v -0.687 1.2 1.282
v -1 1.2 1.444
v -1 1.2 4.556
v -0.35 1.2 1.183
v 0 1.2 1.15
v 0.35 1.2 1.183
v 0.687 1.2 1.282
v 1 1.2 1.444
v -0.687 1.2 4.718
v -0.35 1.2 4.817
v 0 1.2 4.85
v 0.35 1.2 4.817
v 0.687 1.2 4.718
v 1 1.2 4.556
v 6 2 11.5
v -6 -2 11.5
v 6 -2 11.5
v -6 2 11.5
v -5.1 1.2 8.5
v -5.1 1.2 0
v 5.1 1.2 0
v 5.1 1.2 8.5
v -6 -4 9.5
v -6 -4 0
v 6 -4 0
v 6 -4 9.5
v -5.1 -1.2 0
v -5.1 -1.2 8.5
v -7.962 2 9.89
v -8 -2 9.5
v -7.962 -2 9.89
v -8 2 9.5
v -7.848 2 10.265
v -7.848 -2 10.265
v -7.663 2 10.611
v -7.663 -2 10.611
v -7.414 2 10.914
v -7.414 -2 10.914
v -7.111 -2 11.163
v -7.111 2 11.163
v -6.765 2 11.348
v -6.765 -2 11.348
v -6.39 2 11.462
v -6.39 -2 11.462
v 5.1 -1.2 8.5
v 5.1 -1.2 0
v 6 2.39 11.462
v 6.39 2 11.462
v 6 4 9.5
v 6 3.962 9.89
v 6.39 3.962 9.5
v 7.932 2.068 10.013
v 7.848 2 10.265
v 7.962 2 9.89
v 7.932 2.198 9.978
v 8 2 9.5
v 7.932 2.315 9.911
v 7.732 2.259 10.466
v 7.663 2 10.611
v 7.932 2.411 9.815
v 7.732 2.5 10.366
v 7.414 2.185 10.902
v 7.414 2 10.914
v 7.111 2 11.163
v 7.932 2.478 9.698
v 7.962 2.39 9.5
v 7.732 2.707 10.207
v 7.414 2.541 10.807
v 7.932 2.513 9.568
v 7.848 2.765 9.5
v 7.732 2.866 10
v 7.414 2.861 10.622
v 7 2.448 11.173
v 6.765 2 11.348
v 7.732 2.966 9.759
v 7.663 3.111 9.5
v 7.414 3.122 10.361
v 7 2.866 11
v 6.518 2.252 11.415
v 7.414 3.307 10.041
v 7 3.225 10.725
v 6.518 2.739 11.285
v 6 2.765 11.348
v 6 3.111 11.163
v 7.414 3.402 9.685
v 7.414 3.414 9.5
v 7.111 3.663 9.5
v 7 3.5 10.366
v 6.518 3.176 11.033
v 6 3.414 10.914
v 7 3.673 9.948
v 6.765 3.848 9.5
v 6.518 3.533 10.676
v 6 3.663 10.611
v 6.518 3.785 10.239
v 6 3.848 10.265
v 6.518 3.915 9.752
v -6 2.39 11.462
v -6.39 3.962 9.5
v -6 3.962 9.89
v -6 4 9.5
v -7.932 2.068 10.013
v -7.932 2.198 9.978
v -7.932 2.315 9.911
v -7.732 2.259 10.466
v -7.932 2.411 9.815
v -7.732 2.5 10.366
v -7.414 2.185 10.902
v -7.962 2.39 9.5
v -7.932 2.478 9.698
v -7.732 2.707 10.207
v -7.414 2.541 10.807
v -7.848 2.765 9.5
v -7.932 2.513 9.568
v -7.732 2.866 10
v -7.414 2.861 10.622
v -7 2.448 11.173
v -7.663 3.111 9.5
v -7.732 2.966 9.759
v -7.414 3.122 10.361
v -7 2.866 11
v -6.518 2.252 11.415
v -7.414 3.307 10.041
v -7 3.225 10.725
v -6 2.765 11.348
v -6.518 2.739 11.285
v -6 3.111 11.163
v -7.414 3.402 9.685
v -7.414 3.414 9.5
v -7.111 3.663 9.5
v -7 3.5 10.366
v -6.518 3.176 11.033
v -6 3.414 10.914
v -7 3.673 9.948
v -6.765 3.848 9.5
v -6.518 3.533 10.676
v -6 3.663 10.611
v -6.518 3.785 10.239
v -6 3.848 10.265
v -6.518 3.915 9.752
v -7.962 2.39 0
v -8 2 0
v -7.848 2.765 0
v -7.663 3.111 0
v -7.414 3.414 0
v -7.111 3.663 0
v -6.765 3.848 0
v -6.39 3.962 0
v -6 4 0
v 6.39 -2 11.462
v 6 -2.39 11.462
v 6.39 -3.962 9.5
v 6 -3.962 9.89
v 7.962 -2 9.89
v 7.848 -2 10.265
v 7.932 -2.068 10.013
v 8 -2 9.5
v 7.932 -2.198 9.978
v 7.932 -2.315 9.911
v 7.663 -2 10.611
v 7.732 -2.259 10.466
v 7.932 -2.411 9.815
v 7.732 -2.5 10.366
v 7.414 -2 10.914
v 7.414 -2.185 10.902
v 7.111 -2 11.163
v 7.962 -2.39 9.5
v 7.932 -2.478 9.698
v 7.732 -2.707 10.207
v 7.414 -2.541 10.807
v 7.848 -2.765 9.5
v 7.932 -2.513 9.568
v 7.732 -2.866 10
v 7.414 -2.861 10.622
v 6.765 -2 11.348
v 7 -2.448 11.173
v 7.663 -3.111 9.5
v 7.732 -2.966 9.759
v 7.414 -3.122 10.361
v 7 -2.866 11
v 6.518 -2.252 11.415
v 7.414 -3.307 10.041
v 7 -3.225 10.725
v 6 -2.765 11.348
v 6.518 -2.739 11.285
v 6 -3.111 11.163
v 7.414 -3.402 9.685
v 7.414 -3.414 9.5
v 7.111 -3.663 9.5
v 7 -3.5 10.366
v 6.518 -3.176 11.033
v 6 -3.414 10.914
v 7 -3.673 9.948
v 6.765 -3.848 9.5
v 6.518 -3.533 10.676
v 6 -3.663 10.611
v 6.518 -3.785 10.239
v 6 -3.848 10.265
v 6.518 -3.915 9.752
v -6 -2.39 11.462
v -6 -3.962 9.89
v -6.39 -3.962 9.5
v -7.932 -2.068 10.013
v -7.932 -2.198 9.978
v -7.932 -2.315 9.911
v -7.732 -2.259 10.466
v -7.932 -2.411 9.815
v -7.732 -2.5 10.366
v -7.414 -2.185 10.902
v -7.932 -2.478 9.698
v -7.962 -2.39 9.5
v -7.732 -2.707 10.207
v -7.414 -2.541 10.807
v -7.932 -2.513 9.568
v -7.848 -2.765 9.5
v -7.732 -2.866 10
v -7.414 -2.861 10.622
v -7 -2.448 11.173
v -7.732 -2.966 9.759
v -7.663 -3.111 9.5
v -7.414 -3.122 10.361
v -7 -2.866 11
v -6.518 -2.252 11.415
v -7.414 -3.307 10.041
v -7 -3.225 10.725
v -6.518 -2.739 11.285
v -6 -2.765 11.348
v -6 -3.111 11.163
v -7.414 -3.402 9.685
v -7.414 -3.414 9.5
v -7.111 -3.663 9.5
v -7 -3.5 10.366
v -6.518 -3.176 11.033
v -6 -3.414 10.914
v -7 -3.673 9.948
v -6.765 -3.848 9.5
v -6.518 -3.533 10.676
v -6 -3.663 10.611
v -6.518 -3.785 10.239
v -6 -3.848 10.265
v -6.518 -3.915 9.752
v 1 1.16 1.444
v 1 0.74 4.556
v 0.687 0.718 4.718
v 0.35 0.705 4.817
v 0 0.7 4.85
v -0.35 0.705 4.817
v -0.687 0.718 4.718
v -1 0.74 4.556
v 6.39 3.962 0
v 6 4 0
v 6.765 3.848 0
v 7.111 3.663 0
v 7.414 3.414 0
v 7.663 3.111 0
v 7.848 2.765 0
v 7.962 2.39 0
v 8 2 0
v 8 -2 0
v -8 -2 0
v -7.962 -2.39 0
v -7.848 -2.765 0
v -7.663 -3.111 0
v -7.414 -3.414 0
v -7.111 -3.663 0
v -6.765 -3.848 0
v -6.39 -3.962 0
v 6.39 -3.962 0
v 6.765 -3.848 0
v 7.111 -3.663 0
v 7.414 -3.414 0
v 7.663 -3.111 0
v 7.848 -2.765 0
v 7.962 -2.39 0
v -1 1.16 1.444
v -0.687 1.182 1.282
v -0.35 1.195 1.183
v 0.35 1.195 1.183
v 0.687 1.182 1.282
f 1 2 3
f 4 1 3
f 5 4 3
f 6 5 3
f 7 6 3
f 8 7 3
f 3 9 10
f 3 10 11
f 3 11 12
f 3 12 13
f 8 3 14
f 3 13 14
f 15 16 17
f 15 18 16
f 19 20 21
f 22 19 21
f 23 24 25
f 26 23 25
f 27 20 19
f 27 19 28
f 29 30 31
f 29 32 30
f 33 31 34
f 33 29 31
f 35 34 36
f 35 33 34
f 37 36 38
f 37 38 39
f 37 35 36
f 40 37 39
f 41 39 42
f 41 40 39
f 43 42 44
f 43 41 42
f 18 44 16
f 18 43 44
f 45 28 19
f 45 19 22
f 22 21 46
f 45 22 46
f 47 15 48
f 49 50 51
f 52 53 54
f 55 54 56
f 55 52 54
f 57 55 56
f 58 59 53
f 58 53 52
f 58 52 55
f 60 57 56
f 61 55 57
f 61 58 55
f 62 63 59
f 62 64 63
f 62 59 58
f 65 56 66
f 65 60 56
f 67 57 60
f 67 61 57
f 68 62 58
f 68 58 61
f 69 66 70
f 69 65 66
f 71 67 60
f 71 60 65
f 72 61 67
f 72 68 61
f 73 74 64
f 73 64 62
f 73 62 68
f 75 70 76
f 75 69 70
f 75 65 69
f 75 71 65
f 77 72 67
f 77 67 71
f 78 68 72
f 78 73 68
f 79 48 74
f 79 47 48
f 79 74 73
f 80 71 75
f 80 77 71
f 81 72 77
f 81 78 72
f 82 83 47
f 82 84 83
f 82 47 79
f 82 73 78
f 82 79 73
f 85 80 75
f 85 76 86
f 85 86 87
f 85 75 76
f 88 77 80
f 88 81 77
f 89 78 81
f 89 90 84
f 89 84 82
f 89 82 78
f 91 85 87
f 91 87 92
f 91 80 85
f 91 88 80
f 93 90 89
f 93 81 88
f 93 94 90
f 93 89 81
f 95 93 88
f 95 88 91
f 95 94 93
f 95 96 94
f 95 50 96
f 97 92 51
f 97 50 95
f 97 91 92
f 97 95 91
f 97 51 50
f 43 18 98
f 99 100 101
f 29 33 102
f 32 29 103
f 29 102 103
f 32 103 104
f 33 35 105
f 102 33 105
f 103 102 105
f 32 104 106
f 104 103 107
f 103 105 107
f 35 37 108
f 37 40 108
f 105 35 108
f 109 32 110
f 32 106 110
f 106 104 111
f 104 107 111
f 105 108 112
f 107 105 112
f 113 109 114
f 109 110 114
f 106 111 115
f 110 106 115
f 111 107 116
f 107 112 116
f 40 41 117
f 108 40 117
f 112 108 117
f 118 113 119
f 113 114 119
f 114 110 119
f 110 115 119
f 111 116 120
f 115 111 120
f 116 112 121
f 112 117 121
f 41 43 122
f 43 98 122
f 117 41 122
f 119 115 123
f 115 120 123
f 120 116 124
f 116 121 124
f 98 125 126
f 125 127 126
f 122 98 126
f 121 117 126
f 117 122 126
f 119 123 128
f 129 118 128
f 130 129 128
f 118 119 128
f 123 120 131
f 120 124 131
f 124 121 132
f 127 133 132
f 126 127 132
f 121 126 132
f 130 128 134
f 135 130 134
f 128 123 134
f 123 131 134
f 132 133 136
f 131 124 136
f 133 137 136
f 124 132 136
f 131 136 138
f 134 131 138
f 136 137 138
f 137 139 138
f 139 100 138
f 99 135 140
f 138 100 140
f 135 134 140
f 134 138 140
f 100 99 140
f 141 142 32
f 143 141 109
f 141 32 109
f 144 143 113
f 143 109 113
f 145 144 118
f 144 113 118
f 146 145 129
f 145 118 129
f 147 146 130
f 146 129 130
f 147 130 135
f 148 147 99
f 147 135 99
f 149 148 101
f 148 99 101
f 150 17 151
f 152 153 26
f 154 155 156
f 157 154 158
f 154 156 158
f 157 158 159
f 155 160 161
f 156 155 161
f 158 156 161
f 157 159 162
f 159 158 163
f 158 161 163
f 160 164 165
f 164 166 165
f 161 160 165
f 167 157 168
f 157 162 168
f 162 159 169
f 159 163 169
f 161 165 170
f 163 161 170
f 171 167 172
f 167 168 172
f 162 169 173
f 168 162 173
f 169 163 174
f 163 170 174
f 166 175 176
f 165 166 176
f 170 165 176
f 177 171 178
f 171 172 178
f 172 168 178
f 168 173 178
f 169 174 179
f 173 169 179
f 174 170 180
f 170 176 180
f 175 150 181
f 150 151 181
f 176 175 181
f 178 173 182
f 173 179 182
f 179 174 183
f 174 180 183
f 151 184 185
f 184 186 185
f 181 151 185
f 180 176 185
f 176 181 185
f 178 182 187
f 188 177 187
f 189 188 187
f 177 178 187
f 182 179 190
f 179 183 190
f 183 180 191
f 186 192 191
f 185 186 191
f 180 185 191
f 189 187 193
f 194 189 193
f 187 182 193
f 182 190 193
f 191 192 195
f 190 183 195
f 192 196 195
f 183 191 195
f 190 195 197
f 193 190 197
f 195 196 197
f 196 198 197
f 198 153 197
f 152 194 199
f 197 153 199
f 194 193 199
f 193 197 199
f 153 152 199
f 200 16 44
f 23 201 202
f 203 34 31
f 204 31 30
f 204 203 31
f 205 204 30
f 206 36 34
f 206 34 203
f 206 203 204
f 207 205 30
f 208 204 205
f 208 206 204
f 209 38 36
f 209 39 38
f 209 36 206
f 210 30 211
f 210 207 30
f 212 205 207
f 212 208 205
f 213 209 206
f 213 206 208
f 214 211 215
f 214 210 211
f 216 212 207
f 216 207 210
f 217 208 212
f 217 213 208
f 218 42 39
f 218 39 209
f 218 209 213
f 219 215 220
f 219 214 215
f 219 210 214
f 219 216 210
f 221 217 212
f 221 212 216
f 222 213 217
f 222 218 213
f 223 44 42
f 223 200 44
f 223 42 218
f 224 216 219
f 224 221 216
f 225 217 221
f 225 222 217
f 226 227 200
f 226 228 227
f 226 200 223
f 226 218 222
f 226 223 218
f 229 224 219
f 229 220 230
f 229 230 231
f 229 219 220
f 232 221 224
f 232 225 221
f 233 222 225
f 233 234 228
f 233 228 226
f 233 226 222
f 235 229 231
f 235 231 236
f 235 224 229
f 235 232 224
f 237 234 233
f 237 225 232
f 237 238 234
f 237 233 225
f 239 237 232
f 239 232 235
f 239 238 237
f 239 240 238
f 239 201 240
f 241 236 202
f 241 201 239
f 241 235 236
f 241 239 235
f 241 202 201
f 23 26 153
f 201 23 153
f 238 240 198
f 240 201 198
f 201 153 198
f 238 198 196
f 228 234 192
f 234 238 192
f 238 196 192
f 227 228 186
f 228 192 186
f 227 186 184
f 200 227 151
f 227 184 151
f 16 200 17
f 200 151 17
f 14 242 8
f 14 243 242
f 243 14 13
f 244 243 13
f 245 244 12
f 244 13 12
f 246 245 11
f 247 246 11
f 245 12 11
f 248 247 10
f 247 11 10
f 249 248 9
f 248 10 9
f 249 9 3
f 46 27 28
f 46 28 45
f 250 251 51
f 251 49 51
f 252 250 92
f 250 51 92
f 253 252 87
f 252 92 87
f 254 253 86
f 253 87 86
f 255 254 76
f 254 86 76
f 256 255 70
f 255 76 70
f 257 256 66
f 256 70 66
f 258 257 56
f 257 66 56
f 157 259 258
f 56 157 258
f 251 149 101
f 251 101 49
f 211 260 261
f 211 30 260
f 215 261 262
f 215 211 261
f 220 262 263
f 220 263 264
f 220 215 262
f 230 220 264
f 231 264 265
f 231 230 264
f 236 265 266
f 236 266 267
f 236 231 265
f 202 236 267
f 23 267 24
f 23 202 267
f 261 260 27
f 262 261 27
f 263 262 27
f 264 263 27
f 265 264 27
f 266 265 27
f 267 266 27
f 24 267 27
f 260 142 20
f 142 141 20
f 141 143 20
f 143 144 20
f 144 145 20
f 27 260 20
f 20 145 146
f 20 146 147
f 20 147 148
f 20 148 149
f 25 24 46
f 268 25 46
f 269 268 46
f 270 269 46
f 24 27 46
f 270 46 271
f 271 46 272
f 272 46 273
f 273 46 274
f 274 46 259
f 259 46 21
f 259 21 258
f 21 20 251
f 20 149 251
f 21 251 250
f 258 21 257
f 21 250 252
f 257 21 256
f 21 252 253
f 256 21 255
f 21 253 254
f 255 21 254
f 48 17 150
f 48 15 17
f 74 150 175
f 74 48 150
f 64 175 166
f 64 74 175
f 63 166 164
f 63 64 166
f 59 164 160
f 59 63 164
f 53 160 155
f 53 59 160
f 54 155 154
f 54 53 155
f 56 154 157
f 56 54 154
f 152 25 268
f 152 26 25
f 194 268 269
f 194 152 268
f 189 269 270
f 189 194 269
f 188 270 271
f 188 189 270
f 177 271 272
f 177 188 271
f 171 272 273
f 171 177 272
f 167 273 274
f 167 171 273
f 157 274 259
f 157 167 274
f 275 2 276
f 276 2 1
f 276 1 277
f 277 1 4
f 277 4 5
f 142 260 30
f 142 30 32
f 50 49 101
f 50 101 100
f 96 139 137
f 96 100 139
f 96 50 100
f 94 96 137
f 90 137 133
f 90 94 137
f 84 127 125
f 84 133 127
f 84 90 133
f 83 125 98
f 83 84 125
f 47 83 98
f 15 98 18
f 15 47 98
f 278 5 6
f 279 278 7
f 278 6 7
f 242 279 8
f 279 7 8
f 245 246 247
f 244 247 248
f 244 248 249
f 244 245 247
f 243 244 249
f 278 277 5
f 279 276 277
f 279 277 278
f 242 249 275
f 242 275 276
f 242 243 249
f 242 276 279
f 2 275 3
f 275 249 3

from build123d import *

# Parameters (mm, degrees)
F0_W      = 16
F0_H      = 8
F1_DEPTH  = 11.5
F2_W      = 10.2
F2_H      = 2.4
F3_DEPTH  = 8.5
F4_R      = 1.85
F5_DEPTH  = 0.5
F7_W      = 2
F7_H      = 3.7
F8_DEPTH  = 0.8
F9_SIZE2  = 3.69999
F9_SIZE   = 0.49999
F12_DEPTH = 1
F14_R     = 2


# Not quite as in the source:
# - a fillet or chamfer is up to 0.001 mm smaller than in the source, because OpenCascade refuses the exact size


with BuildPart() as f1:
    # F0 (on Top) → F1 (new body)
    with BuildSketch(Plane.XY):
        Rectangle(F0_W, F0_H)
    extrude(amount=F1_DEPTH)

    # F2 (on face) → F3 (cut)
    with BuildSketch(Plane(origin=(0, 0, 0), x_dir=(1, 0, 0), z_dir=(0, 0, -1))):
        Rectangle(F2_W, F2_H)
    extrude(amount=-F3_DEPTH, mode=Mode.SUBTRACT)

    # F14
    f14_edges = [f1.edges().sort_by_distance(p)[0] for p in [
        (0, -4, 11.5),
        (0, 4, 11.5),
        (8, 0, 11.5),
        (-8, 0, 11.5),
        (-8, -4, 5.75),
        (8, -4, 5.75),
        (8, 4, 5.75),
        (-8, 4, 5.75),
    ]]
    fillet(f14_edges, radius=F14_R)


with BuildPart() as f5:
    # F4 (on face) → F5 (new body)
    with BuildSketch(Plane.XZ.offset(-1.2)):
        with Locations((0, 3)):
            Circle(F4_R)
    extrude(amount=F5_DEPTH)


with BuildPart() as f8:
    # F7 (on face) → F8 (new body)
    with BuildSketch(Plane.XZ.offset(-1.2)):
        with Locations((0, 3)):
            Rectangle(F7_W, F7_H)
    extrude(amount=F8_DEPTH)

    # F9 (size 0.5 and 3.7 in the source; OpenCascade refuses exactly that, so slightly less here)
    f9_edges = [f8.edges().sort_by_distance(p)[0] for p in [
        (0, 0.4, 1.15),
    ]]
    f9_side = f8.faces().sort_by_distance((0, 0.8, 1.15))[0]
    chamfer(f9_edges, length=F9_SIZE, length2=F9_SIZE2, reference=f9_side)


with BuildPart() as f12:
    # F11 (on Right) → F12 (new body, symmetric)
    with BuildSketch(Plane.YZ):
        Polygon((1.2, 1.15), (1.2, 4.85), (0.7, 4.85), align=None)
    extrude(amount=F12_DEPTH, both=True)


with BuildPart() as f5_1:
    add(f5.part)

    # F13: intersect F12
    add(f12.part, mode=Mode.INTERSECT)


solid = Compound([f1.part, f5_1.part])
